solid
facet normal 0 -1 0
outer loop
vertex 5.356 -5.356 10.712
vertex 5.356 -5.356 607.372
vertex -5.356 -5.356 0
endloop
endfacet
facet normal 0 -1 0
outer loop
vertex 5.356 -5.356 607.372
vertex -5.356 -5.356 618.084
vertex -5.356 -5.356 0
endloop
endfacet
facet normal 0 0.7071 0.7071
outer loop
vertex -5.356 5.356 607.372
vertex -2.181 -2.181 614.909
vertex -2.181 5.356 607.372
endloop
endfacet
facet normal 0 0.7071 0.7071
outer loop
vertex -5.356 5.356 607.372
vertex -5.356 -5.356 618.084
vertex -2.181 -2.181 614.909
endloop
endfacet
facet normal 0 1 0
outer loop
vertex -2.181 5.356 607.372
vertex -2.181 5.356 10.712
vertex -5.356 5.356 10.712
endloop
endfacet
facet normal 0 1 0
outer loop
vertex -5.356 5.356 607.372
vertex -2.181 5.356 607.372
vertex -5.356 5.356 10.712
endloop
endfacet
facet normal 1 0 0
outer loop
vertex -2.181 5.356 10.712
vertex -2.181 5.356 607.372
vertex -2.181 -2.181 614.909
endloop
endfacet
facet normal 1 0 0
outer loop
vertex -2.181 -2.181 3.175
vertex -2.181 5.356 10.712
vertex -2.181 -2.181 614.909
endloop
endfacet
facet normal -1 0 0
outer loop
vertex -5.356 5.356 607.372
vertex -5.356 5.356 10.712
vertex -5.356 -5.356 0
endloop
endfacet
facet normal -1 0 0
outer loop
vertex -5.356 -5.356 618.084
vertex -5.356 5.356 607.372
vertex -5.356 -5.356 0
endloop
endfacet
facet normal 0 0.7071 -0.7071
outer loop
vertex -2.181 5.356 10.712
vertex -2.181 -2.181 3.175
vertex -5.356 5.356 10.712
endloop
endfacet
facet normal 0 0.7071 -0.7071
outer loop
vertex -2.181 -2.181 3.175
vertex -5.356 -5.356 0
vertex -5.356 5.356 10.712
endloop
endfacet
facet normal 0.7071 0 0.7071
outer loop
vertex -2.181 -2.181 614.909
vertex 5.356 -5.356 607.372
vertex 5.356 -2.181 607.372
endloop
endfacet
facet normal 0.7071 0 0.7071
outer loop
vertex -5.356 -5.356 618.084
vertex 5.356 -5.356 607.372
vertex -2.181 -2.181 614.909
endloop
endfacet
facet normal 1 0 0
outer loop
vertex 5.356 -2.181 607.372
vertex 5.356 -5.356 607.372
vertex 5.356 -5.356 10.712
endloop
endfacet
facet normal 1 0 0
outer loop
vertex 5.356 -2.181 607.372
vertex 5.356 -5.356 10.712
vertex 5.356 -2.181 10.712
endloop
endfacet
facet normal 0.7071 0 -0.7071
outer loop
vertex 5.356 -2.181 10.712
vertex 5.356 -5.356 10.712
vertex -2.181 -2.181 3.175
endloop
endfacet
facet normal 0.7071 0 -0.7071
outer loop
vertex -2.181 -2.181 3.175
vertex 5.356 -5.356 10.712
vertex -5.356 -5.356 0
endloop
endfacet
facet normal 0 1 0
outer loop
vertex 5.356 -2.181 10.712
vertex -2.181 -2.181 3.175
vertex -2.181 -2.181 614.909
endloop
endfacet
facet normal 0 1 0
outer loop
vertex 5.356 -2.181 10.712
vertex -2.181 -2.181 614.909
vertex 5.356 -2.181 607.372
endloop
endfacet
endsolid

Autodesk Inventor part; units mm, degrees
ref_plane "YZ Plane" through (0, 0, 0) normal (1, 0, 0) x (0, 1, 0)
ref_plane "XZ Plane" through (0, 0, 0) normal (0, 1, 0) x (-1, 0, 0)
sketch "Sketch1" plane through (0, 0, 0) normal (0, 0, 1) x (1, 0, 0)
  line L0 (-5.3558, -5.3558) -> (5.3558, -5.3558)
  line L1 (5.3558, -5.3558) -> (5.3558, 5.3558)
  line L2 (5.3558, 5.3558) -> (-5.3558, 5.3558)
  line L3 (-5.3558, 5.3558) -> (-5.3558, -5.3558)
  line L4 (-5.3558, -5.3558) -> (5.3558, 5.3558) construction
  line L5 (5.3558, -5.3558) -> (-5.3558, 5.3558) construction
  line L6 (5.3558, 5.3558) -> (-2.1808, 5.3558)
  line L7 (-2.1808, 5.3558) -> (-2.1808, -2.1808)
  line L8 (-2.1808, -2.1808) -> (5.3558, -2.1808)
  line L9 (5.3558, -2.1808) -> (5.3558, 5.3558)
  point P0 (0, 0)
  dimension "d0" = 3.175
  dimension "d1" = 3.175
extrude "Extrusion1" add sketch "Sketch1" along normal blind 618.0836 contours L3 L2 L7 L8 L1 L0
sketch "Sketch2" plane through (-5.3558, -5.3558, 0) normal (-1, 0, 0) x (0, 0, 1)
  line L0 (0, 10.7115) -> (0, 0) projected
  line L1 (0, 0) -> (618.0836, 0) projected
  line L2 (0, 10.7115) -> (618.0836, 10.7115) projected
  line L3 (309.0418, 10.7115) -> (309.0418, 0)
  line L4 (618.0836, 0) -> (607.3721, 10.7115)
  line L5 (618.0836, 0) -> (633.232, 0) construction
  line L6 (607.3721, 10.7115) -> (618.0836, 10.7115)
  line L7 (618.0836, 0) -> (618.0836, 10.7115)
  line L8 (0, 10.7115) -> (0, 0)
  line L9 (0, 0) -> (10.7115, 10.7115)
  line L10 (0, 0) -> (-15.1484, 0) construction
  line L11 (10.7115, 10.7115) -> (0, 10.7115)
  line L12 (0, 0) -> (0, 10.7115)
  point P0 (0, 5.3558)
  dimension "d4" = 135
extrude "Extrusion2" cut sketch "Sketch2" against normal blind 25.4 contours L2 L9 L0 | L4 L2 L7
ref_plane "Work Plane1" through (-2.1808, -2.1808, 614.9086) normal (-0.7071068, 0.7071068, 0) x (0, 0, 1)
mirror "Mirror1" about plane through (-2.1808, -2.1808, 614.9086) normal (-0.7071068, 0.7071068, 0) of "Extrusion2"
properties part number "2222_Brass Angle Bracket_V1" material "Brass"
